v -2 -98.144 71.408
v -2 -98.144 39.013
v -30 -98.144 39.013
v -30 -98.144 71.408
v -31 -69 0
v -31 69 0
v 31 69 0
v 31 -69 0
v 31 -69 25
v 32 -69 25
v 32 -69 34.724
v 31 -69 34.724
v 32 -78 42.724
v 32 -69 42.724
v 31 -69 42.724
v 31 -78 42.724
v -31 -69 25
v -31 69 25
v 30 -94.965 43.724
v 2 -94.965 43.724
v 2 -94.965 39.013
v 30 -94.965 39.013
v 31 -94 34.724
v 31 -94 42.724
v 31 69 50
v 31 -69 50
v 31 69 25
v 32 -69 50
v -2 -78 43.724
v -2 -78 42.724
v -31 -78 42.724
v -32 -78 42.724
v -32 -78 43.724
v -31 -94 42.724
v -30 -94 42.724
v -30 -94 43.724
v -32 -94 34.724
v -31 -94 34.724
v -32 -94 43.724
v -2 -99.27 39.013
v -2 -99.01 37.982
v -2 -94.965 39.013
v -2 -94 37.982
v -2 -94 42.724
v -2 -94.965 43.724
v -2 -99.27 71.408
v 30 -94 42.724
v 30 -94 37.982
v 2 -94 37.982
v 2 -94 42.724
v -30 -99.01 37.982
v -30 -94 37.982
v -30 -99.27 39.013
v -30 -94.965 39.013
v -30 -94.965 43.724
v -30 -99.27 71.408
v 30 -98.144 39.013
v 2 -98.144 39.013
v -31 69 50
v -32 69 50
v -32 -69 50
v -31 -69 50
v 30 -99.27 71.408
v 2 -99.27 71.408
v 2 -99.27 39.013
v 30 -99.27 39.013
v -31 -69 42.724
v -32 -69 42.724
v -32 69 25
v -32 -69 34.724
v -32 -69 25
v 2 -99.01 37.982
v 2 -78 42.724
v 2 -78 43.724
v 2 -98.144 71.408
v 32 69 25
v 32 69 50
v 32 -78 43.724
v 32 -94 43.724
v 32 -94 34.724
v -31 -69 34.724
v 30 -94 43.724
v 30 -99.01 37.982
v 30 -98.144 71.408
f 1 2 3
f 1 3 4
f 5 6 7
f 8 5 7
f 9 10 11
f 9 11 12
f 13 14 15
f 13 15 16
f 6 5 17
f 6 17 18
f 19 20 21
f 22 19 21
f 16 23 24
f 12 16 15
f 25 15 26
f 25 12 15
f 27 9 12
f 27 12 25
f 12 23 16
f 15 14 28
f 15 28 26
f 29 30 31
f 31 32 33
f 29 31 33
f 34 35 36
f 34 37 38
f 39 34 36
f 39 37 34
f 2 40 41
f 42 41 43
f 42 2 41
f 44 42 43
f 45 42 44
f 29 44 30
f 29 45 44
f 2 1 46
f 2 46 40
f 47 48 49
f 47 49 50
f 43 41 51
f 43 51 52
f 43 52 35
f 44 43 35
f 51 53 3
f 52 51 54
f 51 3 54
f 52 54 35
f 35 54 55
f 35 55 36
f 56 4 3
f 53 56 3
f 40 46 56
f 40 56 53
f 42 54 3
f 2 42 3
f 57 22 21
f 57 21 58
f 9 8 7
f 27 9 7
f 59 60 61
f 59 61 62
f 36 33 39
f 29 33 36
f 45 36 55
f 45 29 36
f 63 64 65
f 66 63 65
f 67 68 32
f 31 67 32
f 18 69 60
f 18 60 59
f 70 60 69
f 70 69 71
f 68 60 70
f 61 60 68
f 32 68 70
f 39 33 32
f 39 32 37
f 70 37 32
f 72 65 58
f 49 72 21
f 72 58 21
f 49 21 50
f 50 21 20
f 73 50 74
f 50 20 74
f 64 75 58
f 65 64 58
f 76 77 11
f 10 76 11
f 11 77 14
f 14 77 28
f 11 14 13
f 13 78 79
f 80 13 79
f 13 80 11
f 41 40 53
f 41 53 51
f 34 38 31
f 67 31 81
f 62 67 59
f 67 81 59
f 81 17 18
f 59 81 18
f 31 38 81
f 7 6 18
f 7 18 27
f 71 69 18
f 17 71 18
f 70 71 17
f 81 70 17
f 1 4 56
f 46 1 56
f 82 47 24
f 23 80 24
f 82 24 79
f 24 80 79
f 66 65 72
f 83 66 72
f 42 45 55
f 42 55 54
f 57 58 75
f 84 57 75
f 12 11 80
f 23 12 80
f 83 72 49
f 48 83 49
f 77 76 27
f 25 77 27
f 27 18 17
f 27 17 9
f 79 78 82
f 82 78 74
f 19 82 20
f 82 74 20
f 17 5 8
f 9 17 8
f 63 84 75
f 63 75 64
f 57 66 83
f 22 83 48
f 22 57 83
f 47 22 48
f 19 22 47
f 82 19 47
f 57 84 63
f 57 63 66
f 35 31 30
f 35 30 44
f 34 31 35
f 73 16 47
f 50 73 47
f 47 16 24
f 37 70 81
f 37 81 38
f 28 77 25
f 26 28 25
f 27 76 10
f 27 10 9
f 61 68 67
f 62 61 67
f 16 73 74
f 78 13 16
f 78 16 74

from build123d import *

# Parameters (mm, degrees)
F0_W      = 62
F0_H      = 138
F1_DEPTH  = 25
F2_W      = 1
F2_H      = 138
F3_DEPTH  = 25
F5_W      = 25
F5_H      = 8
F6_DEPTH  = 1
F7_W      = 16
F7_H      = 1
F8_DEPTH  = 30
F10_DEPTH = 28


with BuildPart() as f1:
    # F0 (on Top) → F1 (new body)
    with BuildSketch(Plane.XY):
        Rectangle(F0_W, F0_H)
    extrude(amount=F1_DEPTH)


with BuildPart() as f3:
    # F2 (on face) → F3 (new body)
    with BuildSketch(Plane.XY.offset(25)):
        with Locations((-31.5, 0)):
            Rectangle(F2_W, F2_H)
    extrude(amount=F3_DEPTH)

    # F5 (on face) → F6 (join, through all)
    with BuildSketch(Plane(origin=(-32, 0, 0), x_dir=(0, -1, 0), z_dir=(-1, 0, 0))):
        with Locations((81.5, 38.7235513926)):
            Rectangle(F5_W, F5_H)
    extrude(amount=-F6_DEPTH)

    # F7 (on face) → F8 (join)
    with BuildSketch(Plane(origin=(-32, 0, 0), x_dir=(0, -1, 0), z_dir=(-1, 0, 0))):
        with Locations((86, 43.2235513926)):
            Rectangle(F7_W, F7_H)
    extrude(amount=-F8_DEPTH)

    # F9 (on face) → F10 (join)
    with BuildSketch(Plane.YZ.offset(-2)):
        Polygon((-94, 42.7235513926), (-94, 43.7235513926), (-94.965338707, 43.7235513926), (-94.965338707, 39.0134323388), (-98.1440097094, 39.0134323388), (-98.1440097094, 71.4083015919), (-99.2697253823, 71.4083015919), (-99.2697253823, 39.0134323388), (-99.009655416, 37.9822161049), (-94.965338707, 37.9822161049), (-94, 37.9822161049), align=None)
    extrude(amount=-F10_DEPTH)


with BuildPart() as f3b:
    # F2 (on face) → F3, piece 2 (new body)
    with BuildSketch(Plane.XY.offset(25)):
        with Locations((31.5, 0)):
            Rectangle(F2_W, F2_H)
    extrude(amount=F3_DEPTH)


with BuildPart() as f12_1:
    # F12: instance of F3
    add(f3.part.mirror(Plane.YZ))


solid = Compound([f1.part, f3.part, f12_1.part])
